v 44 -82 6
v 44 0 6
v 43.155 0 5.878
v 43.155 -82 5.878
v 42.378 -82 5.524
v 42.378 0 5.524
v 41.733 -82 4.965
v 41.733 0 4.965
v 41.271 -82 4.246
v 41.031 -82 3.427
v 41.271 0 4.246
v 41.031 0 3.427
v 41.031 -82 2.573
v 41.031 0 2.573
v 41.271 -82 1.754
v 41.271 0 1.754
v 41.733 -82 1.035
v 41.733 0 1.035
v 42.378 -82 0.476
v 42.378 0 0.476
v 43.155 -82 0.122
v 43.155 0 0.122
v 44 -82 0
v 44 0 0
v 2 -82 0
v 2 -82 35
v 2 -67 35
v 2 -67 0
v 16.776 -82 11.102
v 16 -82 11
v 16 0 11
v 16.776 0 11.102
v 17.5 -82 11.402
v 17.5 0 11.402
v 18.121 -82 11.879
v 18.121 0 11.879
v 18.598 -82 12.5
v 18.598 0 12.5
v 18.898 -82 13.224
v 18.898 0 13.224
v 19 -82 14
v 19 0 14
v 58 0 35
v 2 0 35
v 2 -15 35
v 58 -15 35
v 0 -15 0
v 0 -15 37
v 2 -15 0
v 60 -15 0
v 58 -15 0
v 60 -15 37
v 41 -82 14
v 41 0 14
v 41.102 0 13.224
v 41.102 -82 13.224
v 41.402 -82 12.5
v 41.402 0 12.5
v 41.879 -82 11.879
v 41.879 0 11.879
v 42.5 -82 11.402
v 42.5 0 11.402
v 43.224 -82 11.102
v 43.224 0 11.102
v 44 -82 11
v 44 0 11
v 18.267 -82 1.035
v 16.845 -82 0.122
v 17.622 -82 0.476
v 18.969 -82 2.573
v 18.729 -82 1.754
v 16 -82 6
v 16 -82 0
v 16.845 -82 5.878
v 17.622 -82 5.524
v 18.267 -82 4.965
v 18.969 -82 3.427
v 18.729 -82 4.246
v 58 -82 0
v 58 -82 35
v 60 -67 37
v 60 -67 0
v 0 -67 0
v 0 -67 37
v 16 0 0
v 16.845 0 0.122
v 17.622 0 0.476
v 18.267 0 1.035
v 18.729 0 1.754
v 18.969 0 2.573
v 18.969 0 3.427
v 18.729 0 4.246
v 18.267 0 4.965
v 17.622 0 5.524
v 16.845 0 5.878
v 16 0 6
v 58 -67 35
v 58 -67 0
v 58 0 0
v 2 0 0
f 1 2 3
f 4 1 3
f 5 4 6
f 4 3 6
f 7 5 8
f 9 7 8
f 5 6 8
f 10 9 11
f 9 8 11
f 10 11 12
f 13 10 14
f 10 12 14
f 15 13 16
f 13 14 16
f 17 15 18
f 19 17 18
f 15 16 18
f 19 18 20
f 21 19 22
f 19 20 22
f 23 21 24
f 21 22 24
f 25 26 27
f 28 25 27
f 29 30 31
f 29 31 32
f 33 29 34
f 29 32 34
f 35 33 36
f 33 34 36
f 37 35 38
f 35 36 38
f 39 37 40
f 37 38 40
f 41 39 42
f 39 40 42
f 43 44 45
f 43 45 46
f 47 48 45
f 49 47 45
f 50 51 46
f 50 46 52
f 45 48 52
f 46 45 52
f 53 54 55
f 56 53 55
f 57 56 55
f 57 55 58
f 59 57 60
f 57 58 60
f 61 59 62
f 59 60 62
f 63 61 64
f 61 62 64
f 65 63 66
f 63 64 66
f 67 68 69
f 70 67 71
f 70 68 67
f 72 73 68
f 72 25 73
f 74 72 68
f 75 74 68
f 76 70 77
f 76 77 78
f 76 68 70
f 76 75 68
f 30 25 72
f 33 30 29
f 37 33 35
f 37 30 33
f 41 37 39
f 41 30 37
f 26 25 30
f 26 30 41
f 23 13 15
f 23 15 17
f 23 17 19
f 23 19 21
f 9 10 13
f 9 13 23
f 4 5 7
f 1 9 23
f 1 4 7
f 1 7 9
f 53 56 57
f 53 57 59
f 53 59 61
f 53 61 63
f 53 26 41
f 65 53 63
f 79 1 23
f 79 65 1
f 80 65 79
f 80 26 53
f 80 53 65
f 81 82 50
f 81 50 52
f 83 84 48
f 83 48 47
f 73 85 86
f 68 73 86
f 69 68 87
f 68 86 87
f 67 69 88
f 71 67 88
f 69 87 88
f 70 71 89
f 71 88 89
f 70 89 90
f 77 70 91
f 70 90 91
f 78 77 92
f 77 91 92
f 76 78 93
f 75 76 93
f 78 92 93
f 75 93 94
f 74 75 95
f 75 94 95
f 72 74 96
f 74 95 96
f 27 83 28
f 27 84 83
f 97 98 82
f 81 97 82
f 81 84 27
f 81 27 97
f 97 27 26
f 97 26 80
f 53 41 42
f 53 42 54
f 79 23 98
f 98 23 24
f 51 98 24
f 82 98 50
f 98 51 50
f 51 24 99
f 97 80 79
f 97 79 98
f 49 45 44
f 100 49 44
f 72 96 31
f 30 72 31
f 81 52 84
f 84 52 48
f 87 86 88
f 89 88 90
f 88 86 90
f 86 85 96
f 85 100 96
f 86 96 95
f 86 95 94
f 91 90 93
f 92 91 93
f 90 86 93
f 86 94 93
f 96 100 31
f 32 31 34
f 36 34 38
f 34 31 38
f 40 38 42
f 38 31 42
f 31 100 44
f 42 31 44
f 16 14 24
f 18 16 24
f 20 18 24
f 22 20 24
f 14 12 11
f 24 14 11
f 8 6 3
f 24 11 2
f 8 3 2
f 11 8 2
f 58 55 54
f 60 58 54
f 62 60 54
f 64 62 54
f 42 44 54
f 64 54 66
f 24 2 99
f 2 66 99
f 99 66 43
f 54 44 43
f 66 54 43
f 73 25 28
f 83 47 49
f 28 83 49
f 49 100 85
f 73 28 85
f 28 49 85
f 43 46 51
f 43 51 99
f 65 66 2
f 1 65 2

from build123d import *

# Parameters (mm, degrees)
F1_DEPTH = 82
F2_W     = 60
F2_H     = 15
F3_DEPTH = 2
F4_W     = 2
F4_H     = 15
F5_DEPTH = 35


with BuildPart() as f1:
    # F0 (on Front) → F1 (new body)
    with BuildSketch(Plane.XZ):
        with BuildLine():
            ThreePointArc((16, 11), (18.12132, 11.87868), (19, 14))
            Line((19, 14), (41, 14))
            ThreePointArc((41, 14), (41.87868, 11.87868), (44, 11))
            Line((44, 11), (44, 6))
            ThreePointArc((44, 6), (41, 3), (44, 0))
            Line((44, 0), (60, 0))
            Line((60, 0), (60, 37))
            Line((60, 37), (0, 37))
            Line((0, 37), (0, 0))
            Line((0, 0), (16, 0))
            ThreePointArc((16, 0), (19, 3), (16, 6))
            Line((16, 6), (16, 11))
        make_face()
    extrude(amount=F1_DEPTH)

    # F2 (on face) → F3 (cut)
    with BuildSketch(Plane.XY.offset(37)):
        with Locations((30, -7.5)):
            Rectangle(F2_W, F2_H)
        with Locations((30, -74.5)):
            Rectangle(F2_W, F2_H)
    extrude(amount=-F3_DEPTH, mode=Mode.SUBTRACT)

    # F4 (on face) → F5 (cut)
    with BuildSketch(Plane.XY.offset(35)):
        with Locations((1, -7.5)):
            Rectangle(F4_W, F4_H)
        with Locations((59, -7.5)):
            Rectangle(F4_W, F4_H)
        with Locations((1, -74.5)):
            Rectangle(F4_W, F4_H)
        with Locations((59, -74.5)):
            Rectangle(F4_W, F4_H)
    extrude(amount=-F5_DEPTH, mode=Mode.SUBTRACT)


solid = f1.part
